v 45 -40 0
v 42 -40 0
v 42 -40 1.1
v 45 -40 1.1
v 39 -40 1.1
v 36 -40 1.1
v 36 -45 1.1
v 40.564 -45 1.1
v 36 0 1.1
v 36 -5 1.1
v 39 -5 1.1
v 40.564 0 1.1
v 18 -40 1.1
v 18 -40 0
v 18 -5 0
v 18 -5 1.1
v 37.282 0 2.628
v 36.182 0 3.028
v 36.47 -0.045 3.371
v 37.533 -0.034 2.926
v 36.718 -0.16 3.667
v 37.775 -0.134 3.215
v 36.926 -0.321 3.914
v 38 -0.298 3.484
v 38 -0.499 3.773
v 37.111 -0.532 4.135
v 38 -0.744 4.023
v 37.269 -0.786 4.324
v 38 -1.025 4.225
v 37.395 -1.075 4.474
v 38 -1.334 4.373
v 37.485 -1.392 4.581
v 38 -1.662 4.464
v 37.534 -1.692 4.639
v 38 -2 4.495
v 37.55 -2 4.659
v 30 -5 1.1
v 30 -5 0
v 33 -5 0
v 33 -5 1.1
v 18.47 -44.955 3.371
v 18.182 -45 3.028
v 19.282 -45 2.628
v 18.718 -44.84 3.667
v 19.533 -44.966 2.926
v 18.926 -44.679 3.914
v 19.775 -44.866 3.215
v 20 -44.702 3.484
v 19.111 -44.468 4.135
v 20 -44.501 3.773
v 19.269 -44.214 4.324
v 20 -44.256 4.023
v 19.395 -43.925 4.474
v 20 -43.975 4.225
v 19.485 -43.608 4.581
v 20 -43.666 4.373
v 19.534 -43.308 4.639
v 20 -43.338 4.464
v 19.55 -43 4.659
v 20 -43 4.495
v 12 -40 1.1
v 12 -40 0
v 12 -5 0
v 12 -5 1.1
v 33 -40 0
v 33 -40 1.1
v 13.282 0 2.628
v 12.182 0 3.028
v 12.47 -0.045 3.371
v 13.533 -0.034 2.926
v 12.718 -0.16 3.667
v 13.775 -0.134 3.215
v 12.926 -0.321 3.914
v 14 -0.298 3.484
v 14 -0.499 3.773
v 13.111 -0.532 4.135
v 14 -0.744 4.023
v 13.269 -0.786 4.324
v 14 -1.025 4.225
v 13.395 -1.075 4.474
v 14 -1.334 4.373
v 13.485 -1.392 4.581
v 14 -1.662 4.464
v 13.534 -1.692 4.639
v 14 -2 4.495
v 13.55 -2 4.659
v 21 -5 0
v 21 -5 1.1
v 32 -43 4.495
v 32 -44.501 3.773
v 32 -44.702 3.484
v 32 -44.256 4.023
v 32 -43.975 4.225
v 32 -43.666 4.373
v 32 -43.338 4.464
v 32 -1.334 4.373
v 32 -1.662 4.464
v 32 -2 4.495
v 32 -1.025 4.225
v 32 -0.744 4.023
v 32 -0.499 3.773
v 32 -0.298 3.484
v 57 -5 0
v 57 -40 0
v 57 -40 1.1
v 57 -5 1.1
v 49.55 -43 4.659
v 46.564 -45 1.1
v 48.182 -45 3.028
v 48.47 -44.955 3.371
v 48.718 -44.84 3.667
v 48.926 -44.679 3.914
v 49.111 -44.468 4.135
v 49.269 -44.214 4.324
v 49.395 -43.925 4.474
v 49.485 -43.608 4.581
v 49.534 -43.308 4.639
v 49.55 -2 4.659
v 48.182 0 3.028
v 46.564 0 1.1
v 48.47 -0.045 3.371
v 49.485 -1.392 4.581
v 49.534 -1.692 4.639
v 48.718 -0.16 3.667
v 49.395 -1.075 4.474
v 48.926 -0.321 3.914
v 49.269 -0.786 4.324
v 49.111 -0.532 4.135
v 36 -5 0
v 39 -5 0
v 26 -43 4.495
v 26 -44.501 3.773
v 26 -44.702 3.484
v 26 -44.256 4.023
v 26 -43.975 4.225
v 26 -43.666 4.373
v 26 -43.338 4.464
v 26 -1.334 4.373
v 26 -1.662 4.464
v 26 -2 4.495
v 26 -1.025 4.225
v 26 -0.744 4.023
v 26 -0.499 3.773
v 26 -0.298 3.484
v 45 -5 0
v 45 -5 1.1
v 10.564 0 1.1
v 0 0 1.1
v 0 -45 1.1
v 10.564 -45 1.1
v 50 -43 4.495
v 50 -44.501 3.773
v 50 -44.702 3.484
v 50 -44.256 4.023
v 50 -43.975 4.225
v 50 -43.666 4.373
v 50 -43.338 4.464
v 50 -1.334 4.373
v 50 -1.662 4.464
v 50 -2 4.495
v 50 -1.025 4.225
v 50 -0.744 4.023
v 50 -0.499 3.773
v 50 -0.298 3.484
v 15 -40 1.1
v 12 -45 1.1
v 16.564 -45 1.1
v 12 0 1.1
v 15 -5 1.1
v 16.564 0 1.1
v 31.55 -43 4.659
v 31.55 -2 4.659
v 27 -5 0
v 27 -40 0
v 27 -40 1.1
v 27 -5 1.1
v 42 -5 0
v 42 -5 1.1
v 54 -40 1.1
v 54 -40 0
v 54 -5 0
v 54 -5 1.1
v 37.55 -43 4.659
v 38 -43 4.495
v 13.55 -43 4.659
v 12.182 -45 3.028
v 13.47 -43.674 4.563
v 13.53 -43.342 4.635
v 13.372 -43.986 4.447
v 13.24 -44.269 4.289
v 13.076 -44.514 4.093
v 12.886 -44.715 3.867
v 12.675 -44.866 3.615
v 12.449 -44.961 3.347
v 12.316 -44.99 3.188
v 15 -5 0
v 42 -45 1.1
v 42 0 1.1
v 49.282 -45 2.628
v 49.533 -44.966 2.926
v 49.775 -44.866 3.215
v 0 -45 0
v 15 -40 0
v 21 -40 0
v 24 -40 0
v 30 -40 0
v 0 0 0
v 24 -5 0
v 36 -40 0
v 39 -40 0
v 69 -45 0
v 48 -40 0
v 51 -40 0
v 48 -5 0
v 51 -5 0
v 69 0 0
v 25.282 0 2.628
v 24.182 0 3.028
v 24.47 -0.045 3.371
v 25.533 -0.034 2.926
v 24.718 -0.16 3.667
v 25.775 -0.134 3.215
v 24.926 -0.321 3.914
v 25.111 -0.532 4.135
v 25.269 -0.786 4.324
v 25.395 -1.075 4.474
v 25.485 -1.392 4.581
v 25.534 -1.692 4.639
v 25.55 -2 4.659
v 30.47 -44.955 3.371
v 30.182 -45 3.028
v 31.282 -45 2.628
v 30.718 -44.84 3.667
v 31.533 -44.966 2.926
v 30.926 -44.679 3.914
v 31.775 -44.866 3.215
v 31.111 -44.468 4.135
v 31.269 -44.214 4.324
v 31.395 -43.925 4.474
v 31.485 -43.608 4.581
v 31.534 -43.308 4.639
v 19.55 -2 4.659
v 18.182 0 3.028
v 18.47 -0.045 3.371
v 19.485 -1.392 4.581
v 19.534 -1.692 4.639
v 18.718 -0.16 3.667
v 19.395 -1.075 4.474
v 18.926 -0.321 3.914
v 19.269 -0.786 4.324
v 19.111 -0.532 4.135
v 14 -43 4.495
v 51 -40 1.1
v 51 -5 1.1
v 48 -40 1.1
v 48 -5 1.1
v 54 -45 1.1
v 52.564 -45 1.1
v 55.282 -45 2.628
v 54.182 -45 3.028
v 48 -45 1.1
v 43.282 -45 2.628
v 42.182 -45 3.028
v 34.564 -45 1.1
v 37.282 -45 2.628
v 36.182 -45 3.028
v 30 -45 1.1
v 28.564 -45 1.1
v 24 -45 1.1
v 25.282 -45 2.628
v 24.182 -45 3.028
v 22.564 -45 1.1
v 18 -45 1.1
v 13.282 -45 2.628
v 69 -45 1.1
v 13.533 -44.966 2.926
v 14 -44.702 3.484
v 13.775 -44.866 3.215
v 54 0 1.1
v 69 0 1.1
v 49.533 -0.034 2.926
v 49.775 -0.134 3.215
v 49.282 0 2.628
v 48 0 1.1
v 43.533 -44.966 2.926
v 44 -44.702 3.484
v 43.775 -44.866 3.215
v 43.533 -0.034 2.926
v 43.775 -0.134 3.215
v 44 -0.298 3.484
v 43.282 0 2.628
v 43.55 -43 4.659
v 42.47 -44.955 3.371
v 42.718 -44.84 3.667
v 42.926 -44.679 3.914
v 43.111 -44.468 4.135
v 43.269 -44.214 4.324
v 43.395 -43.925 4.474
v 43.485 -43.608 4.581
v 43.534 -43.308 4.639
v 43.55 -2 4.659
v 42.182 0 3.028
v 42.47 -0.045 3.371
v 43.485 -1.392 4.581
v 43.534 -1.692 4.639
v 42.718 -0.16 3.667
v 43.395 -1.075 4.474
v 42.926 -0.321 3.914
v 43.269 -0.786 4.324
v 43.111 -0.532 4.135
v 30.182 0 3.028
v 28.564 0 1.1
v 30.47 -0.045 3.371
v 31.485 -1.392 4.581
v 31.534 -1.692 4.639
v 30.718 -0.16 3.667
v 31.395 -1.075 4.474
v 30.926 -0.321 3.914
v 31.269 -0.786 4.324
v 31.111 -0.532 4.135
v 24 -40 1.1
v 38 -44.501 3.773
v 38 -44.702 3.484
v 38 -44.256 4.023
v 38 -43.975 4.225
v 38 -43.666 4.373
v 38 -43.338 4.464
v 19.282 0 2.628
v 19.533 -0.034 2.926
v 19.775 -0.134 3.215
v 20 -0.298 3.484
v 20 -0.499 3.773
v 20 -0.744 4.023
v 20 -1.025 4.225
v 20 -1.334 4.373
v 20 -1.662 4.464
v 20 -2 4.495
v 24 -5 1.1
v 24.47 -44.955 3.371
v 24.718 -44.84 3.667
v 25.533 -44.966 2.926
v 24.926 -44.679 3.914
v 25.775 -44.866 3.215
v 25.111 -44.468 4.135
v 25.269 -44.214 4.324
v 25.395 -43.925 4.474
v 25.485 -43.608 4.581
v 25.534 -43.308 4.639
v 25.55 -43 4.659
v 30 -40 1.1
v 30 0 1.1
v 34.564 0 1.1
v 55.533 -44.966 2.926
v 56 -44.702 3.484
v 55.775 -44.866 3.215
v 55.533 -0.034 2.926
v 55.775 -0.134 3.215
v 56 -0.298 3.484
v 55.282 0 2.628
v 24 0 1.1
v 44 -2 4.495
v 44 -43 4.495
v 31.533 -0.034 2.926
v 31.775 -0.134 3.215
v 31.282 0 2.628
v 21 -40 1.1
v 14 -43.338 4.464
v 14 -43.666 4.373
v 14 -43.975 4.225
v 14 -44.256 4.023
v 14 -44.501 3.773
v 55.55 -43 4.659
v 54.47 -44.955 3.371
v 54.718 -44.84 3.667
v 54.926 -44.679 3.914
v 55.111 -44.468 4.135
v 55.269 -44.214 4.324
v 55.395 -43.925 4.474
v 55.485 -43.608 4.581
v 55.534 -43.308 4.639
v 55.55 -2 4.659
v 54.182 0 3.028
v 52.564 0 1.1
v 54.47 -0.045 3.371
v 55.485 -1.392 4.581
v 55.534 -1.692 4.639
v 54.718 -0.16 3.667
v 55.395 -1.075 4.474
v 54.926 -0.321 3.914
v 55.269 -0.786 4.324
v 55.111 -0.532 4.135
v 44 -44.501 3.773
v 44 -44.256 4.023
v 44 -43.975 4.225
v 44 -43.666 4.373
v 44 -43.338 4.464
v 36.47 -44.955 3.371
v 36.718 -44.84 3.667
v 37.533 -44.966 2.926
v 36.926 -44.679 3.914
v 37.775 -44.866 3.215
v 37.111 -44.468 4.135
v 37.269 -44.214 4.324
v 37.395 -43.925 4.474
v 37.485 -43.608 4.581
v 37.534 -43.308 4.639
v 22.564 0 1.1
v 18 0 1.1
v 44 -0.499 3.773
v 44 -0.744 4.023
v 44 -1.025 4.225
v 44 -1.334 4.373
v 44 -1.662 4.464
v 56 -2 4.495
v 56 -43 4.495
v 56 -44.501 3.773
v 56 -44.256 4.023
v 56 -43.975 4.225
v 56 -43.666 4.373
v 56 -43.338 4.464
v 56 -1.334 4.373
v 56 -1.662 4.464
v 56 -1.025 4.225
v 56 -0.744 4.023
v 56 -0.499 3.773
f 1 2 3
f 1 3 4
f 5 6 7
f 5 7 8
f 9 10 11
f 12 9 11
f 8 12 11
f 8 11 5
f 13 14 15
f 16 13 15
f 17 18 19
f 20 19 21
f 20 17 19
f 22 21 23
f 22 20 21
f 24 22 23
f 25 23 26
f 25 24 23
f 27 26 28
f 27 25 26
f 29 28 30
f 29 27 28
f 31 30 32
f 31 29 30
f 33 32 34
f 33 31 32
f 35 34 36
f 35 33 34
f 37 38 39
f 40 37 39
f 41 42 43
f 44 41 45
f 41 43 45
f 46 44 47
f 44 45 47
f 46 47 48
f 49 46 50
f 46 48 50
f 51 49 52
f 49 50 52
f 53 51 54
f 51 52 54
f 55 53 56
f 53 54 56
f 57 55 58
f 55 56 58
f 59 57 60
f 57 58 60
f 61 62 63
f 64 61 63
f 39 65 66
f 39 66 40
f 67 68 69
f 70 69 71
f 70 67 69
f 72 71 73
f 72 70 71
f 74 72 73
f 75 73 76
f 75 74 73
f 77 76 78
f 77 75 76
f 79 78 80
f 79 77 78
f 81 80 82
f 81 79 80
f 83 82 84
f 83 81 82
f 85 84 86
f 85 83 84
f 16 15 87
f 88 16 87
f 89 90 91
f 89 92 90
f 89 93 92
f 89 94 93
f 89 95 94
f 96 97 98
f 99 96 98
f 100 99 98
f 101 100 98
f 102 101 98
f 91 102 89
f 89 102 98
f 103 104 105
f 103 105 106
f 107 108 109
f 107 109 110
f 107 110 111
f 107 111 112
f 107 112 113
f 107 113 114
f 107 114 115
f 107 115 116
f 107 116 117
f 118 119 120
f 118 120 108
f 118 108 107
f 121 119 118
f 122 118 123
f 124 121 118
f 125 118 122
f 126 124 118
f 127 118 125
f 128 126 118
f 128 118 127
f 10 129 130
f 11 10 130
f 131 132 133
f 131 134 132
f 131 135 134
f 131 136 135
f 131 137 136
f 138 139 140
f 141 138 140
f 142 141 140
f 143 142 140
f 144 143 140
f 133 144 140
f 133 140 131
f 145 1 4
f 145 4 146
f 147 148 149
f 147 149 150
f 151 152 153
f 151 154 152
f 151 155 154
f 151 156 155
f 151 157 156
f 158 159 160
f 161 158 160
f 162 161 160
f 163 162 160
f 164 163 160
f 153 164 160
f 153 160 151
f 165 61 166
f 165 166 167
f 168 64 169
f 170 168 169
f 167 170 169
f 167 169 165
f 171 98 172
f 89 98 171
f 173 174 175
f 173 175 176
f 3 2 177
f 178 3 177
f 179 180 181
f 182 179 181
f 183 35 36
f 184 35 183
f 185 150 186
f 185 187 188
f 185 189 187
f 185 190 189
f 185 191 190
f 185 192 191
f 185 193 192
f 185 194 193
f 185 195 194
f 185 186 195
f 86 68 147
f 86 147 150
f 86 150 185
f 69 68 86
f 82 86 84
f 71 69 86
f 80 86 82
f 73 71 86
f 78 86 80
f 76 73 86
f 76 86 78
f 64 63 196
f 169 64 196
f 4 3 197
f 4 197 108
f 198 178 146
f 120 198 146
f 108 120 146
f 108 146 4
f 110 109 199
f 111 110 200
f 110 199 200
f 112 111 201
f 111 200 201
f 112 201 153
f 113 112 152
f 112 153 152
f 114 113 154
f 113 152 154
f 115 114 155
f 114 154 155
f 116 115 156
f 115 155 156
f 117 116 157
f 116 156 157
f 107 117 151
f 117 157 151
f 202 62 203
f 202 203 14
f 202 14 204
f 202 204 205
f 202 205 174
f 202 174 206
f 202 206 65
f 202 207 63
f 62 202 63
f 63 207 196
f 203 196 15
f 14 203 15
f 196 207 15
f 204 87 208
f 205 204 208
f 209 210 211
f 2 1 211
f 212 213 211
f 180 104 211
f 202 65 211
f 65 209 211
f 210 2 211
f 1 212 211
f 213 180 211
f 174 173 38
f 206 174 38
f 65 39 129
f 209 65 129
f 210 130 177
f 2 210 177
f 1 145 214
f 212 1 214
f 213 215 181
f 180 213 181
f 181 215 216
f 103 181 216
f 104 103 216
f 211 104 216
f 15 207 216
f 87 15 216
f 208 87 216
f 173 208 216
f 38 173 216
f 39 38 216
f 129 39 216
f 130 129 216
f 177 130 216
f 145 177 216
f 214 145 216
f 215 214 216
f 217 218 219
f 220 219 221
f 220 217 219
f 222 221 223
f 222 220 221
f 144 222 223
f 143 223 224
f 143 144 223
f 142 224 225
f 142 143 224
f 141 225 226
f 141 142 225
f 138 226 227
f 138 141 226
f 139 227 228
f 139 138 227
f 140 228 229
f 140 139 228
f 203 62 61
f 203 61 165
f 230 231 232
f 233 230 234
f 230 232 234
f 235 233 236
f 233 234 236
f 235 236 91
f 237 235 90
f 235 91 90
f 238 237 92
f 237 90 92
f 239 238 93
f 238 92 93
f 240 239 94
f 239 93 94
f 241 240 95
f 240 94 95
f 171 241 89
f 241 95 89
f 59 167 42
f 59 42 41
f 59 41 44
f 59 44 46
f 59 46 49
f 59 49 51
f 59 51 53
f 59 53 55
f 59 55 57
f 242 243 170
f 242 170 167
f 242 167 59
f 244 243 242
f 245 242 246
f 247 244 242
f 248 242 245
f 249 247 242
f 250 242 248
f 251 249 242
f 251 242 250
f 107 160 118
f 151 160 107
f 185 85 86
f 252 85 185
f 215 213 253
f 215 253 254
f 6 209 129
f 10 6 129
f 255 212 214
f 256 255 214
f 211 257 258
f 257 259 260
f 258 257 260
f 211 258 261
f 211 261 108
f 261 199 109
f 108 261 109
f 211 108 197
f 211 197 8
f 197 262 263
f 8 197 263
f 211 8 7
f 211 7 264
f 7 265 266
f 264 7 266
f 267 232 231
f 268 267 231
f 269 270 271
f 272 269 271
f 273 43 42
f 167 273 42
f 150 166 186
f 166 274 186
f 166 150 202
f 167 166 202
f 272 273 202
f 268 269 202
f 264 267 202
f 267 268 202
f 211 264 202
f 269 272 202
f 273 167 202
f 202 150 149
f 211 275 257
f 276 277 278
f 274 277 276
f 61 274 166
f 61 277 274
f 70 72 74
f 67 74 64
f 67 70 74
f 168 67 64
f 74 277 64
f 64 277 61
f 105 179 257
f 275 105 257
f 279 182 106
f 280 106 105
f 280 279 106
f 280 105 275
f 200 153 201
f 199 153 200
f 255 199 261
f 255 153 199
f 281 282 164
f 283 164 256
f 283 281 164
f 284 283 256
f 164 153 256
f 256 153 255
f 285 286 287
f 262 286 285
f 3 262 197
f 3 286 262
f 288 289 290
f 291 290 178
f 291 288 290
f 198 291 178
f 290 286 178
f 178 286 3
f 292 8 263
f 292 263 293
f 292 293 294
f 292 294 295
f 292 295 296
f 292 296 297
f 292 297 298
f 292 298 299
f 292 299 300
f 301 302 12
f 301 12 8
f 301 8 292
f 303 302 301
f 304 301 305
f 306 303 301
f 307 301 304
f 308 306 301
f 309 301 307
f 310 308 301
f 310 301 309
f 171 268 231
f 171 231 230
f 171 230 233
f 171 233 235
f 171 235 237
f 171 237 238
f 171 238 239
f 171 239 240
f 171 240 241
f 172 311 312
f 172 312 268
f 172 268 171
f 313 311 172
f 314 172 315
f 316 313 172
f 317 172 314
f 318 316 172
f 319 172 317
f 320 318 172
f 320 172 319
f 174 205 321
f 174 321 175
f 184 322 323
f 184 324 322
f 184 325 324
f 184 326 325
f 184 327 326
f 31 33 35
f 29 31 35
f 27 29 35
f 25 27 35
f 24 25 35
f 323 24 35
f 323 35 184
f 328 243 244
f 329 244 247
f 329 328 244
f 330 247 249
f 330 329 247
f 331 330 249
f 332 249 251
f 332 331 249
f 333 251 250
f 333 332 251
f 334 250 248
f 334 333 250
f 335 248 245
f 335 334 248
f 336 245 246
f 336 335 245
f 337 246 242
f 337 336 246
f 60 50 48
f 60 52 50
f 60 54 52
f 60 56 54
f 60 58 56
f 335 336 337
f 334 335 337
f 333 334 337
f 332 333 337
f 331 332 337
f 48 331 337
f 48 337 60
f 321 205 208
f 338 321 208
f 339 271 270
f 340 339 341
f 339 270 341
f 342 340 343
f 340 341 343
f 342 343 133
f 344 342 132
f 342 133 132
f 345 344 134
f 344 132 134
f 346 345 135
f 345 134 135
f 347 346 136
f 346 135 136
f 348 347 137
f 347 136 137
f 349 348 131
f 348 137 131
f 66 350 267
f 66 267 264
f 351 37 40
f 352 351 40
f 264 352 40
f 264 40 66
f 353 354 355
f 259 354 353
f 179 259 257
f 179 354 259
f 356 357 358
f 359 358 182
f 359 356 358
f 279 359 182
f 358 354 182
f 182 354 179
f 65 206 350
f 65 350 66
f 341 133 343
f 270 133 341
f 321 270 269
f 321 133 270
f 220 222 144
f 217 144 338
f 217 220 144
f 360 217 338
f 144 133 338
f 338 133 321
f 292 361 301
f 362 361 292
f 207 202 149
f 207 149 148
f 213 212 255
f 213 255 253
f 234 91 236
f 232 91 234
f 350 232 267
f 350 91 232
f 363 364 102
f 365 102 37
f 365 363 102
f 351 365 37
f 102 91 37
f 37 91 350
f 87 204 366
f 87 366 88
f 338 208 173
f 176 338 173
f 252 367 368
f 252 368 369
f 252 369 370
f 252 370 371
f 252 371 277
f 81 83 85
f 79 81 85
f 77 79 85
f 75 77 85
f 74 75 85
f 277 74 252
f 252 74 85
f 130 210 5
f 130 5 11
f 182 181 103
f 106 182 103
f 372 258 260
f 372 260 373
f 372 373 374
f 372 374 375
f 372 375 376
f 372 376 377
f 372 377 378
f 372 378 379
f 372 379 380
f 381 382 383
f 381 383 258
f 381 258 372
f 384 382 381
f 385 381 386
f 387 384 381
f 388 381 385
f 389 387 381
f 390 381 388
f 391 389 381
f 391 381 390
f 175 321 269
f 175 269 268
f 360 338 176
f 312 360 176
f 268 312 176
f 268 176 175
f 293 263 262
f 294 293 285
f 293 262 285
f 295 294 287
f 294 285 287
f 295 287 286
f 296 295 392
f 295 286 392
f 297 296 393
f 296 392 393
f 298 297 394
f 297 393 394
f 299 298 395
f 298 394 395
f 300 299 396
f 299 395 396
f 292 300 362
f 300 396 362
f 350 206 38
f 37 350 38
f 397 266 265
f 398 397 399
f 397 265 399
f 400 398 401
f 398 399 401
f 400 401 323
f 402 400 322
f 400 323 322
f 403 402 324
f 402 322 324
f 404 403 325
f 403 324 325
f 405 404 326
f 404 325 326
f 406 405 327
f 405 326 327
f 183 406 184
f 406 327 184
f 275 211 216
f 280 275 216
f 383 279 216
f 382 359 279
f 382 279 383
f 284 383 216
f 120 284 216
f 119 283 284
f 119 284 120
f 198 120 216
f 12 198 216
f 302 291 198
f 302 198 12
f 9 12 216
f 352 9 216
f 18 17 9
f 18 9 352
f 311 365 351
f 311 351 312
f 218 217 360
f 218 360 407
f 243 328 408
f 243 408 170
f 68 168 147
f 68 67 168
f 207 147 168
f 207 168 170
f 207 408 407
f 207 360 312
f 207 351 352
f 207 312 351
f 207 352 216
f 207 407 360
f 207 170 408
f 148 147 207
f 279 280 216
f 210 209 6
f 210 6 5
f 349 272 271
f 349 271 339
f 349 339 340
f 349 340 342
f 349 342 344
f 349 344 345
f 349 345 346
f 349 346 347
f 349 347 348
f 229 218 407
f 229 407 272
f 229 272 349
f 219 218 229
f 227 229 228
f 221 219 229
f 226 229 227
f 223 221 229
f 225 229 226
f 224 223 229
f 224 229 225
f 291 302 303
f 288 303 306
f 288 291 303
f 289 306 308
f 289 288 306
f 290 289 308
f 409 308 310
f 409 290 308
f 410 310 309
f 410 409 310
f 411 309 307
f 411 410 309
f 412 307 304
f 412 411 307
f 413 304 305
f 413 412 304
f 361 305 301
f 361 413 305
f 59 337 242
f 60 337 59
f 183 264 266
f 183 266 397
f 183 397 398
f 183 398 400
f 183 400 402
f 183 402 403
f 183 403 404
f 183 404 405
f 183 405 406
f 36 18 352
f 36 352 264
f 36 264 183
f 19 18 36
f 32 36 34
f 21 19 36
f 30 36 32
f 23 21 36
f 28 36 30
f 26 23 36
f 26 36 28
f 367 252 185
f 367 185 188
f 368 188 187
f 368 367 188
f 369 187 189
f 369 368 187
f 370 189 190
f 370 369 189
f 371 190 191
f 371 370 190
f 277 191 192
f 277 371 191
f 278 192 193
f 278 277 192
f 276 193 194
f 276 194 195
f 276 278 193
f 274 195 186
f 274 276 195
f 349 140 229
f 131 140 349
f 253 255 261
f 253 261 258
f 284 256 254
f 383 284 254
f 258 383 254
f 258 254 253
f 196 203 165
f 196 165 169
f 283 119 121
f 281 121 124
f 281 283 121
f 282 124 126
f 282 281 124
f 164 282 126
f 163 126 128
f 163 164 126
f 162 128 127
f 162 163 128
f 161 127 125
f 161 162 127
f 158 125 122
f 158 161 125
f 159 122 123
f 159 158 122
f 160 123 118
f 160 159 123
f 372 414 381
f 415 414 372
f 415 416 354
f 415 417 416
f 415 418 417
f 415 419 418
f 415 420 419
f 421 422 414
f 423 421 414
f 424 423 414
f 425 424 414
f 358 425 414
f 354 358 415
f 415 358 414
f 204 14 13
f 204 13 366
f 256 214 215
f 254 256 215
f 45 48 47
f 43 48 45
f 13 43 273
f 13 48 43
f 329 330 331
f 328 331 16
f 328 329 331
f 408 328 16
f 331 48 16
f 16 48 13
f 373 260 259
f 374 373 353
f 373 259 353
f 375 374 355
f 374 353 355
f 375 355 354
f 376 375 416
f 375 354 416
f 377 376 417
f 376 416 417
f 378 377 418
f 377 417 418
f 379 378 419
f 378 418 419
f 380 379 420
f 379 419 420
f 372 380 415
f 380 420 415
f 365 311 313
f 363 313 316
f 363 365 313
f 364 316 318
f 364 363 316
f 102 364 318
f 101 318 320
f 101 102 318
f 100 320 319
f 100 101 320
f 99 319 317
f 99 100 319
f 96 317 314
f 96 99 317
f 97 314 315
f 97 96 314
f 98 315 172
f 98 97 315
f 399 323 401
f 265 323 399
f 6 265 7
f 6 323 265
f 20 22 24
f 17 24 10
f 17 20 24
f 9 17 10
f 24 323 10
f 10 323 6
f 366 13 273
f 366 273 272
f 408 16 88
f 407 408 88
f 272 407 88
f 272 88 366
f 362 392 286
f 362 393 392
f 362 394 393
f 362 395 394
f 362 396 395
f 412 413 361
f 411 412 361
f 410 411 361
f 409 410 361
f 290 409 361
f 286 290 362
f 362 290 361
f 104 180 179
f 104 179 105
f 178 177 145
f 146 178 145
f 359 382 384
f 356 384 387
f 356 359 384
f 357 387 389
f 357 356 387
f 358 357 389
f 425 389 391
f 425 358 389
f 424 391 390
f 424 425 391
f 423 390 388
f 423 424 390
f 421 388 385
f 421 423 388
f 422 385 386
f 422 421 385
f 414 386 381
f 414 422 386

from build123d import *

# Parameters (mm, degrees)
F0_W     = 69
F0_H     = 45
F0_W_2   = 3
F0_H_2   = 35
F1_DEPTH = 1.1
F3_DEPTH = 45
F4_SIZE  = 0.7
F5_R     = 2


with BuildPart() as f1:
    # F0 (on Top) → F1 (new body)
    with BuildSketch(Plane.XY):
        with Locations((34.5, -22.5)):
            Rectangle(F0_W, F0_H)
        with Locations((13.5, -22.5)):
            Rectangle(F0_W_2, F0_H_2, mode=Mode.SUBTRACT)
        with Locations((19.5, -22.5)):
            Rectangle(F0_W_2, F0_H_2, mode=Mode.SUBTRACT)
        with Locations((25.5, -22.5)):
            Rectangle(F0_W_2, F0_H_2, mode=Mode.SUBTRACT)
        with Locations((31.5, -22.5)):
            Rectangle(F0_W_2, F0_H_2, mode=Mode.SUBTRACT)
        with Locations((37.5, -22.5)):
            Rectangle(F0_W_2, F0_H_2, mode=Mode.SUBTRACT)
        with Locations((43.5, -22.5)):
            Rectangle(F0_W_2, F0_H_2, mode=Mode.SUBTRACT)
        with Locations((49.5, -22.5)):
            Rectangle(F0_W_2, F0_H_2, mode=Mode.SUBTRACT)
        with Locations((55.5, -22.5)):
            Rectangle(F0_W_2, F0_H_2, mode=Mode.SUBTRACT)
    extrude(amount=F1_DEPTH)

    # F2 (on face) → F3 (join, through all)
    with BuildSketch(Plane(origin=(0, 0, 0), x_dir=(-1, 0, 0), z_dir=(0, 1, 0))):
        Polygon((-12, 1.1), (-10.5640519817, 1.1), (-14, 5.1948033947), (-14, 3.4835071852), align=None)
        Polygon((-18, 1.1), (-16.5640519817, 1.1), (-20, 5.1948033947), (-20, 3.4835071852), align=None)
        Polygon((-24, 1.1), (-22.5640519817, 1.1), (-26, 5.1948033947), (-26, 3.4835071852), align=None)
        Polygon((-32, 3.4835071852), (-30, 1.1), (-28.5640519817, 1.1), (-32, 5.1948033947), align=None)
        Polygon((-38, 3.4835071852), (-36, 1.1), (-34.5640519817, 1.1), (-38, 5.1948033947), align=None)
        Polygon((-44, 3.4835071852), (-42, 1.1), (-40.5640519817, 1.1), (-44, 5.1948033947), align=None)
        Polygon((-50, 3.4835071852), (-48, 1.1), (-46.5640519817, 1.1), (-50, 5.1948033947), align=None)
        Polygon((-56, 3.4835071852), (-54, 1.1), (-52.5640519817, 1.1), (-56, 5.1948033947), align=None)
    extrude(amount=-F3_DEPTH)

    # F4
    f4_edges = [f1.edges().sort_by_distance(p)[0] for p in [
        (14, -22.5, 5.194803),
        (20, -22.5, 5.194803),
        (26, -22.5, 5.194803),
        (32, -22.5, 5.194803),
        (38, -22.5, 5.194803),
        (44, -22.5, 5.194803),
        (50, -22.5, 5.194803),
        (56, -22.5, 5.194803),
    ]]
    chamfer(f4_edges, length=F4_SIZE)

    # F5
    f5_edges = [f1.edges().sort_by_distance(p)[0] for p in [
        (25.775024, -45, 4.576688),
        (13.775024, -45, 4.576688),
        (19.775024, -45, 4.576688),
        (31.775024, -45, 4.576688),
        (37.775024, -45, 4.576688),
        (43.775024, -45, 4.576688),
        (49.775024, -45, 4.576688),
        (55.775024, -45, 4.576688),
        (13.775024, 0, 4.576688),
        (19.775024, 0, 4.576688),
        (25.775024, 0, 4.576688),
        (31.775024, 0, 4.576688),
        (37.775024, 0, 4.576688),
        (43.775024, 0, 4.576688),
        (49.775024, 0, 4.576688),
        (55.775024, 0, 4.576688),
    ]]
    fillet(f5_edges, radius=F5_R)


solid = f1.part
